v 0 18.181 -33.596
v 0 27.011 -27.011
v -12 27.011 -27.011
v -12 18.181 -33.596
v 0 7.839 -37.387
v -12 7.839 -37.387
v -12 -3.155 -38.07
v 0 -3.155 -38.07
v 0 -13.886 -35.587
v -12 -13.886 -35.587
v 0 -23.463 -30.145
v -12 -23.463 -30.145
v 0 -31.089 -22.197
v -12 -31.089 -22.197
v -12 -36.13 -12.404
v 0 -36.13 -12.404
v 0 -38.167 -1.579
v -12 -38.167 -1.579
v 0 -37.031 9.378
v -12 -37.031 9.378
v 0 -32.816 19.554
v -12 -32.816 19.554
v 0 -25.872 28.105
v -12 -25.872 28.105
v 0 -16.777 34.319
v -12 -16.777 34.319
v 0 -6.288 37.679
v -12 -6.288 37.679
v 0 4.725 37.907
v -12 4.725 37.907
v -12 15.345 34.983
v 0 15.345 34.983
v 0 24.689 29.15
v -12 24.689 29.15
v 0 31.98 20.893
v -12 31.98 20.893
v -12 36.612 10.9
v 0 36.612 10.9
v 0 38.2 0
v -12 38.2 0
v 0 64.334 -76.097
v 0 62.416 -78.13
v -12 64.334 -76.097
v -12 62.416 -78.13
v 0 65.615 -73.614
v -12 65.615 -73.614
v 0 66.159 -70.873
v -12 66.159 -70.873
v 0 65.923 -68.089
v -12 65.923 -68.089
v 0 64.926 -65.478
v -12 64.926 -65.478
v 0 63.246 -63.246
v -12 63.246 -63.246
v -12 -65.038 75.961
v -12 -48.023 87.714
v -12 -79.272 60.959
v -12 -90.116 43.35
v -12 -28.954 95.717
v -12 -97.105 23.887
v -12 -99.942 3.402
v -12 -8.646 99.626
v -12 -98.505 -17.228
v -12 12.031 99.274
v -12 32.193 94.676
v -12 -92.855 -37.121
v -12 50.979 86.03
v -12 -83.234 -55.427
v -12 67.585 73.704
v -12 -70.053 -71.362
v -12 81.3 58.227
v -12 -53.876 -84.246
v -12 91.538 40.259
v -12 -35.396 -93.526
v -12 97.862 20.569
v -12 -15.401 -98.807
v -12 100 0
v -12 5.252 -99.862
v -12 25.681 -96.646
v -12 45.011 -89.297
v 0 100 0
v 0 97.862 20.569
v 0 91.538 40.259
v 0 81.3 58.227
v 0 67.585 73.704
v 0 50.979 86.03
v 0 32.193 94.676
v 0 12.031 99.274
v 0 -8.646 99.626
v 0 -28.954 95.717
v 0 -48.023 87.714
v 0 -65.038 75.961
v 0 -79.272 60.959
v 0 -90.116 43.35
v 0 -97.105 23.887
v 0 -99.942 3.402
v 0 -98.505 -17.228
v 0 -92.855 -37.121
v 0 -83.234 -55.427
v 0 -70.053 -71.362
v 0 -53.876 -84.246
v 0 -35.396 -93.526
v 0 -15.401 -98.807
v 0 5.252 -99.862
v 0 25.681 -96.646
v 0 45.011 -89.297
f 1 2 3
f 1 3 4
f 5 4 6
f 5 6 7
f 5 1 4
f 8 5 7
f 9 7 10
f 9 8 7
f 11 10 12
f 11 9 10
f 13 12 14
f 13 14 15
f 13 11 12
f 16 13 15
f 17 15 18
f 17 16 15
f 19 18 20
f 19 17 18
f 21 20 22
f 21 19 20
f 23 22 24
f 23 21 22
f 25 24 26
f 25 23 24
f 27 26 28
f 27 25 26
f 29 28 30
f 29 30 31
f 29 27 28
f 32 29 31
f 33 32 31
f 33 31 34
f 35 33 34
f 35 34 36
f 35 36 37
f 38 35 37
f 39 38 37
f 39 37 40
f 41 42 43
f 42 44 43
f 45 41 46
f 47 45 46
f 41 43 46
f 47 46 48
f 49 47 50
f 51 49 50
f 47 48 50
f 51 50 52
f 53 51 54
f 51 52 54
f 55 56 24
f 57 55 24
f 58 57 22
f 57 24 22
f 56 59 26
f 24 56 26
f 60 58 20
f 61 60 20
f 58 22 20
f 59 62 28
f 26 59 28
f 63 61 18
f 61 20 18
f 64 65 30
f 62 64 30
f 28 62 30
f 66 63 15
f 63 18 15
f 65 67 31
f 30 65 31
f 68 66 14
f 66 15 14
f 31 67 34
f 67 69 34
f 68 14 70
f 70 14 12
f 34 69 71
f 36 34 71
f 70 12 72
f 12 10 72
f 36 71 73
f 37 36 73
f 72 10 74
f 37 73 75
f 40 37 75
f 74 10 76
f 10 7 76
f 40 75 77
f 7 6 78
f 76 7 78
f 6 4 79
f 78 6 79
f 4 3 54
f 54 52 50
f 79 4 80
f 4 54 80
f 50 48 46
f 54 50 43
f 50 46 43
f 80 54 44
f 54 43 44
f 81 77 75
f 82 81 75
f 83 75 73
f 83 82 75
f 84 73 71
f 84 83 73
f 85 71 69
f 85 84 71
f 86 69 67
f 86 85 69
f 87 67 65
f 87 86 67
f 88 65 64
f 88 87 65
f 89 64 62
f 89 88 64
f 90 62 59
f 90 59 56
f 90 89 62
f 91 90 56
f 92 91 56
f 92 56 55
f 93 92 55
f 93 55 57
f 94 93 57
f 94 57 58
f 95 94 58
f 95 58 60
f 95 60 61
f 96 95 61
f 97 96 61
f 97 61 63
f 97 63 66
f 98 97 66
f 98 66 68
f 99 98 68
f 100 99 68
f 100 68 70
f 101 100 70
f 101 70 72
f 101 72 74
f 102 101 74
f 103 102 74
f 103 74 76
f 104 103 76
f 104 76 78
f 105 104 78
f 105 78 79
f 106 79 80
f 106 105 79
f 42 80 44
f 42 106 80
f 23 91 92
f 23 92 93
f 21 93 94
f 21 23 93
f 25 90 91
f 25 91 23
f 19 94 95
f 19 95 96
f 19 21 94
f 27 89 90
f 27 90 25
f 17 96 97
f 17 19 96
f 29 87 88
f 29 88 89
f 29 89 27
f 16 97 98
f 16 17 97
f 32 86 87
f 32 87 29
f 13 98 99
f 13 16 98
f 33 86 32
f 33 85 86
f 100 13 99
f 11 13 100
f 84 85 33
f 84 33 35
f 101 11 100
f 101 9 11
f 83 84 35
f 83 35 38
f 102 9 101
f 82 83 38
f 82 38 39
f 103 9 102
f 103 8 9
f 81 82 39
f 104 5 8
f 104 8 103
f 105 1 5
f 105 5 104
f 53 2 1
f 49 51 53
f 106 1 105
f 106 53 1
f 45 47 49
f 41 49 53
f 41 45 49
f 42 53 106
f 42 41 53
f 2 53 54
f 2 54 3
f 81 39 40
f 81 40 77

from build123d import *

# Parameters (mm, degrees)
SM_BASE_FLANGE_1_DEPTH = 12
FILLET_1_R             = 10


# Sheet-metal steps are written as plain solids
with BuildPart() as part:
    # Sketch 1 → Базовая кромка1 (new body)
    with BuildSketch(Plane(origin=(0, 0, 0), x_dir=(0, 0, -1), z_dir=(1, 0, 0))):
        with BuildLine():
            Line((0, 38.2), (0, 100))
            ThreePointArc((0, 100), (-38.268343237, -92.387953251), (70.710678119, 70.710678119))
            Line((70.710678119, 70.710678119), (27.011479041, 27.011479041))
            ThreePointArc((27.011479041, 27.011479041), (-14.618507116, -35.292198142), (0, 38.2))
        make_face()
    extrude(amount=-SM_BASE_FLANGE_1_DEPTH)

    # Скругление1
    fillet_1_edges = [part.edges().sort_by_distance(p)[0] for p in [
        (-6, 70.710678119, -70.710678119),
    ]]
    fillet(fillet_1_edges, radius=FILLET_1_R)


solid = part.part
